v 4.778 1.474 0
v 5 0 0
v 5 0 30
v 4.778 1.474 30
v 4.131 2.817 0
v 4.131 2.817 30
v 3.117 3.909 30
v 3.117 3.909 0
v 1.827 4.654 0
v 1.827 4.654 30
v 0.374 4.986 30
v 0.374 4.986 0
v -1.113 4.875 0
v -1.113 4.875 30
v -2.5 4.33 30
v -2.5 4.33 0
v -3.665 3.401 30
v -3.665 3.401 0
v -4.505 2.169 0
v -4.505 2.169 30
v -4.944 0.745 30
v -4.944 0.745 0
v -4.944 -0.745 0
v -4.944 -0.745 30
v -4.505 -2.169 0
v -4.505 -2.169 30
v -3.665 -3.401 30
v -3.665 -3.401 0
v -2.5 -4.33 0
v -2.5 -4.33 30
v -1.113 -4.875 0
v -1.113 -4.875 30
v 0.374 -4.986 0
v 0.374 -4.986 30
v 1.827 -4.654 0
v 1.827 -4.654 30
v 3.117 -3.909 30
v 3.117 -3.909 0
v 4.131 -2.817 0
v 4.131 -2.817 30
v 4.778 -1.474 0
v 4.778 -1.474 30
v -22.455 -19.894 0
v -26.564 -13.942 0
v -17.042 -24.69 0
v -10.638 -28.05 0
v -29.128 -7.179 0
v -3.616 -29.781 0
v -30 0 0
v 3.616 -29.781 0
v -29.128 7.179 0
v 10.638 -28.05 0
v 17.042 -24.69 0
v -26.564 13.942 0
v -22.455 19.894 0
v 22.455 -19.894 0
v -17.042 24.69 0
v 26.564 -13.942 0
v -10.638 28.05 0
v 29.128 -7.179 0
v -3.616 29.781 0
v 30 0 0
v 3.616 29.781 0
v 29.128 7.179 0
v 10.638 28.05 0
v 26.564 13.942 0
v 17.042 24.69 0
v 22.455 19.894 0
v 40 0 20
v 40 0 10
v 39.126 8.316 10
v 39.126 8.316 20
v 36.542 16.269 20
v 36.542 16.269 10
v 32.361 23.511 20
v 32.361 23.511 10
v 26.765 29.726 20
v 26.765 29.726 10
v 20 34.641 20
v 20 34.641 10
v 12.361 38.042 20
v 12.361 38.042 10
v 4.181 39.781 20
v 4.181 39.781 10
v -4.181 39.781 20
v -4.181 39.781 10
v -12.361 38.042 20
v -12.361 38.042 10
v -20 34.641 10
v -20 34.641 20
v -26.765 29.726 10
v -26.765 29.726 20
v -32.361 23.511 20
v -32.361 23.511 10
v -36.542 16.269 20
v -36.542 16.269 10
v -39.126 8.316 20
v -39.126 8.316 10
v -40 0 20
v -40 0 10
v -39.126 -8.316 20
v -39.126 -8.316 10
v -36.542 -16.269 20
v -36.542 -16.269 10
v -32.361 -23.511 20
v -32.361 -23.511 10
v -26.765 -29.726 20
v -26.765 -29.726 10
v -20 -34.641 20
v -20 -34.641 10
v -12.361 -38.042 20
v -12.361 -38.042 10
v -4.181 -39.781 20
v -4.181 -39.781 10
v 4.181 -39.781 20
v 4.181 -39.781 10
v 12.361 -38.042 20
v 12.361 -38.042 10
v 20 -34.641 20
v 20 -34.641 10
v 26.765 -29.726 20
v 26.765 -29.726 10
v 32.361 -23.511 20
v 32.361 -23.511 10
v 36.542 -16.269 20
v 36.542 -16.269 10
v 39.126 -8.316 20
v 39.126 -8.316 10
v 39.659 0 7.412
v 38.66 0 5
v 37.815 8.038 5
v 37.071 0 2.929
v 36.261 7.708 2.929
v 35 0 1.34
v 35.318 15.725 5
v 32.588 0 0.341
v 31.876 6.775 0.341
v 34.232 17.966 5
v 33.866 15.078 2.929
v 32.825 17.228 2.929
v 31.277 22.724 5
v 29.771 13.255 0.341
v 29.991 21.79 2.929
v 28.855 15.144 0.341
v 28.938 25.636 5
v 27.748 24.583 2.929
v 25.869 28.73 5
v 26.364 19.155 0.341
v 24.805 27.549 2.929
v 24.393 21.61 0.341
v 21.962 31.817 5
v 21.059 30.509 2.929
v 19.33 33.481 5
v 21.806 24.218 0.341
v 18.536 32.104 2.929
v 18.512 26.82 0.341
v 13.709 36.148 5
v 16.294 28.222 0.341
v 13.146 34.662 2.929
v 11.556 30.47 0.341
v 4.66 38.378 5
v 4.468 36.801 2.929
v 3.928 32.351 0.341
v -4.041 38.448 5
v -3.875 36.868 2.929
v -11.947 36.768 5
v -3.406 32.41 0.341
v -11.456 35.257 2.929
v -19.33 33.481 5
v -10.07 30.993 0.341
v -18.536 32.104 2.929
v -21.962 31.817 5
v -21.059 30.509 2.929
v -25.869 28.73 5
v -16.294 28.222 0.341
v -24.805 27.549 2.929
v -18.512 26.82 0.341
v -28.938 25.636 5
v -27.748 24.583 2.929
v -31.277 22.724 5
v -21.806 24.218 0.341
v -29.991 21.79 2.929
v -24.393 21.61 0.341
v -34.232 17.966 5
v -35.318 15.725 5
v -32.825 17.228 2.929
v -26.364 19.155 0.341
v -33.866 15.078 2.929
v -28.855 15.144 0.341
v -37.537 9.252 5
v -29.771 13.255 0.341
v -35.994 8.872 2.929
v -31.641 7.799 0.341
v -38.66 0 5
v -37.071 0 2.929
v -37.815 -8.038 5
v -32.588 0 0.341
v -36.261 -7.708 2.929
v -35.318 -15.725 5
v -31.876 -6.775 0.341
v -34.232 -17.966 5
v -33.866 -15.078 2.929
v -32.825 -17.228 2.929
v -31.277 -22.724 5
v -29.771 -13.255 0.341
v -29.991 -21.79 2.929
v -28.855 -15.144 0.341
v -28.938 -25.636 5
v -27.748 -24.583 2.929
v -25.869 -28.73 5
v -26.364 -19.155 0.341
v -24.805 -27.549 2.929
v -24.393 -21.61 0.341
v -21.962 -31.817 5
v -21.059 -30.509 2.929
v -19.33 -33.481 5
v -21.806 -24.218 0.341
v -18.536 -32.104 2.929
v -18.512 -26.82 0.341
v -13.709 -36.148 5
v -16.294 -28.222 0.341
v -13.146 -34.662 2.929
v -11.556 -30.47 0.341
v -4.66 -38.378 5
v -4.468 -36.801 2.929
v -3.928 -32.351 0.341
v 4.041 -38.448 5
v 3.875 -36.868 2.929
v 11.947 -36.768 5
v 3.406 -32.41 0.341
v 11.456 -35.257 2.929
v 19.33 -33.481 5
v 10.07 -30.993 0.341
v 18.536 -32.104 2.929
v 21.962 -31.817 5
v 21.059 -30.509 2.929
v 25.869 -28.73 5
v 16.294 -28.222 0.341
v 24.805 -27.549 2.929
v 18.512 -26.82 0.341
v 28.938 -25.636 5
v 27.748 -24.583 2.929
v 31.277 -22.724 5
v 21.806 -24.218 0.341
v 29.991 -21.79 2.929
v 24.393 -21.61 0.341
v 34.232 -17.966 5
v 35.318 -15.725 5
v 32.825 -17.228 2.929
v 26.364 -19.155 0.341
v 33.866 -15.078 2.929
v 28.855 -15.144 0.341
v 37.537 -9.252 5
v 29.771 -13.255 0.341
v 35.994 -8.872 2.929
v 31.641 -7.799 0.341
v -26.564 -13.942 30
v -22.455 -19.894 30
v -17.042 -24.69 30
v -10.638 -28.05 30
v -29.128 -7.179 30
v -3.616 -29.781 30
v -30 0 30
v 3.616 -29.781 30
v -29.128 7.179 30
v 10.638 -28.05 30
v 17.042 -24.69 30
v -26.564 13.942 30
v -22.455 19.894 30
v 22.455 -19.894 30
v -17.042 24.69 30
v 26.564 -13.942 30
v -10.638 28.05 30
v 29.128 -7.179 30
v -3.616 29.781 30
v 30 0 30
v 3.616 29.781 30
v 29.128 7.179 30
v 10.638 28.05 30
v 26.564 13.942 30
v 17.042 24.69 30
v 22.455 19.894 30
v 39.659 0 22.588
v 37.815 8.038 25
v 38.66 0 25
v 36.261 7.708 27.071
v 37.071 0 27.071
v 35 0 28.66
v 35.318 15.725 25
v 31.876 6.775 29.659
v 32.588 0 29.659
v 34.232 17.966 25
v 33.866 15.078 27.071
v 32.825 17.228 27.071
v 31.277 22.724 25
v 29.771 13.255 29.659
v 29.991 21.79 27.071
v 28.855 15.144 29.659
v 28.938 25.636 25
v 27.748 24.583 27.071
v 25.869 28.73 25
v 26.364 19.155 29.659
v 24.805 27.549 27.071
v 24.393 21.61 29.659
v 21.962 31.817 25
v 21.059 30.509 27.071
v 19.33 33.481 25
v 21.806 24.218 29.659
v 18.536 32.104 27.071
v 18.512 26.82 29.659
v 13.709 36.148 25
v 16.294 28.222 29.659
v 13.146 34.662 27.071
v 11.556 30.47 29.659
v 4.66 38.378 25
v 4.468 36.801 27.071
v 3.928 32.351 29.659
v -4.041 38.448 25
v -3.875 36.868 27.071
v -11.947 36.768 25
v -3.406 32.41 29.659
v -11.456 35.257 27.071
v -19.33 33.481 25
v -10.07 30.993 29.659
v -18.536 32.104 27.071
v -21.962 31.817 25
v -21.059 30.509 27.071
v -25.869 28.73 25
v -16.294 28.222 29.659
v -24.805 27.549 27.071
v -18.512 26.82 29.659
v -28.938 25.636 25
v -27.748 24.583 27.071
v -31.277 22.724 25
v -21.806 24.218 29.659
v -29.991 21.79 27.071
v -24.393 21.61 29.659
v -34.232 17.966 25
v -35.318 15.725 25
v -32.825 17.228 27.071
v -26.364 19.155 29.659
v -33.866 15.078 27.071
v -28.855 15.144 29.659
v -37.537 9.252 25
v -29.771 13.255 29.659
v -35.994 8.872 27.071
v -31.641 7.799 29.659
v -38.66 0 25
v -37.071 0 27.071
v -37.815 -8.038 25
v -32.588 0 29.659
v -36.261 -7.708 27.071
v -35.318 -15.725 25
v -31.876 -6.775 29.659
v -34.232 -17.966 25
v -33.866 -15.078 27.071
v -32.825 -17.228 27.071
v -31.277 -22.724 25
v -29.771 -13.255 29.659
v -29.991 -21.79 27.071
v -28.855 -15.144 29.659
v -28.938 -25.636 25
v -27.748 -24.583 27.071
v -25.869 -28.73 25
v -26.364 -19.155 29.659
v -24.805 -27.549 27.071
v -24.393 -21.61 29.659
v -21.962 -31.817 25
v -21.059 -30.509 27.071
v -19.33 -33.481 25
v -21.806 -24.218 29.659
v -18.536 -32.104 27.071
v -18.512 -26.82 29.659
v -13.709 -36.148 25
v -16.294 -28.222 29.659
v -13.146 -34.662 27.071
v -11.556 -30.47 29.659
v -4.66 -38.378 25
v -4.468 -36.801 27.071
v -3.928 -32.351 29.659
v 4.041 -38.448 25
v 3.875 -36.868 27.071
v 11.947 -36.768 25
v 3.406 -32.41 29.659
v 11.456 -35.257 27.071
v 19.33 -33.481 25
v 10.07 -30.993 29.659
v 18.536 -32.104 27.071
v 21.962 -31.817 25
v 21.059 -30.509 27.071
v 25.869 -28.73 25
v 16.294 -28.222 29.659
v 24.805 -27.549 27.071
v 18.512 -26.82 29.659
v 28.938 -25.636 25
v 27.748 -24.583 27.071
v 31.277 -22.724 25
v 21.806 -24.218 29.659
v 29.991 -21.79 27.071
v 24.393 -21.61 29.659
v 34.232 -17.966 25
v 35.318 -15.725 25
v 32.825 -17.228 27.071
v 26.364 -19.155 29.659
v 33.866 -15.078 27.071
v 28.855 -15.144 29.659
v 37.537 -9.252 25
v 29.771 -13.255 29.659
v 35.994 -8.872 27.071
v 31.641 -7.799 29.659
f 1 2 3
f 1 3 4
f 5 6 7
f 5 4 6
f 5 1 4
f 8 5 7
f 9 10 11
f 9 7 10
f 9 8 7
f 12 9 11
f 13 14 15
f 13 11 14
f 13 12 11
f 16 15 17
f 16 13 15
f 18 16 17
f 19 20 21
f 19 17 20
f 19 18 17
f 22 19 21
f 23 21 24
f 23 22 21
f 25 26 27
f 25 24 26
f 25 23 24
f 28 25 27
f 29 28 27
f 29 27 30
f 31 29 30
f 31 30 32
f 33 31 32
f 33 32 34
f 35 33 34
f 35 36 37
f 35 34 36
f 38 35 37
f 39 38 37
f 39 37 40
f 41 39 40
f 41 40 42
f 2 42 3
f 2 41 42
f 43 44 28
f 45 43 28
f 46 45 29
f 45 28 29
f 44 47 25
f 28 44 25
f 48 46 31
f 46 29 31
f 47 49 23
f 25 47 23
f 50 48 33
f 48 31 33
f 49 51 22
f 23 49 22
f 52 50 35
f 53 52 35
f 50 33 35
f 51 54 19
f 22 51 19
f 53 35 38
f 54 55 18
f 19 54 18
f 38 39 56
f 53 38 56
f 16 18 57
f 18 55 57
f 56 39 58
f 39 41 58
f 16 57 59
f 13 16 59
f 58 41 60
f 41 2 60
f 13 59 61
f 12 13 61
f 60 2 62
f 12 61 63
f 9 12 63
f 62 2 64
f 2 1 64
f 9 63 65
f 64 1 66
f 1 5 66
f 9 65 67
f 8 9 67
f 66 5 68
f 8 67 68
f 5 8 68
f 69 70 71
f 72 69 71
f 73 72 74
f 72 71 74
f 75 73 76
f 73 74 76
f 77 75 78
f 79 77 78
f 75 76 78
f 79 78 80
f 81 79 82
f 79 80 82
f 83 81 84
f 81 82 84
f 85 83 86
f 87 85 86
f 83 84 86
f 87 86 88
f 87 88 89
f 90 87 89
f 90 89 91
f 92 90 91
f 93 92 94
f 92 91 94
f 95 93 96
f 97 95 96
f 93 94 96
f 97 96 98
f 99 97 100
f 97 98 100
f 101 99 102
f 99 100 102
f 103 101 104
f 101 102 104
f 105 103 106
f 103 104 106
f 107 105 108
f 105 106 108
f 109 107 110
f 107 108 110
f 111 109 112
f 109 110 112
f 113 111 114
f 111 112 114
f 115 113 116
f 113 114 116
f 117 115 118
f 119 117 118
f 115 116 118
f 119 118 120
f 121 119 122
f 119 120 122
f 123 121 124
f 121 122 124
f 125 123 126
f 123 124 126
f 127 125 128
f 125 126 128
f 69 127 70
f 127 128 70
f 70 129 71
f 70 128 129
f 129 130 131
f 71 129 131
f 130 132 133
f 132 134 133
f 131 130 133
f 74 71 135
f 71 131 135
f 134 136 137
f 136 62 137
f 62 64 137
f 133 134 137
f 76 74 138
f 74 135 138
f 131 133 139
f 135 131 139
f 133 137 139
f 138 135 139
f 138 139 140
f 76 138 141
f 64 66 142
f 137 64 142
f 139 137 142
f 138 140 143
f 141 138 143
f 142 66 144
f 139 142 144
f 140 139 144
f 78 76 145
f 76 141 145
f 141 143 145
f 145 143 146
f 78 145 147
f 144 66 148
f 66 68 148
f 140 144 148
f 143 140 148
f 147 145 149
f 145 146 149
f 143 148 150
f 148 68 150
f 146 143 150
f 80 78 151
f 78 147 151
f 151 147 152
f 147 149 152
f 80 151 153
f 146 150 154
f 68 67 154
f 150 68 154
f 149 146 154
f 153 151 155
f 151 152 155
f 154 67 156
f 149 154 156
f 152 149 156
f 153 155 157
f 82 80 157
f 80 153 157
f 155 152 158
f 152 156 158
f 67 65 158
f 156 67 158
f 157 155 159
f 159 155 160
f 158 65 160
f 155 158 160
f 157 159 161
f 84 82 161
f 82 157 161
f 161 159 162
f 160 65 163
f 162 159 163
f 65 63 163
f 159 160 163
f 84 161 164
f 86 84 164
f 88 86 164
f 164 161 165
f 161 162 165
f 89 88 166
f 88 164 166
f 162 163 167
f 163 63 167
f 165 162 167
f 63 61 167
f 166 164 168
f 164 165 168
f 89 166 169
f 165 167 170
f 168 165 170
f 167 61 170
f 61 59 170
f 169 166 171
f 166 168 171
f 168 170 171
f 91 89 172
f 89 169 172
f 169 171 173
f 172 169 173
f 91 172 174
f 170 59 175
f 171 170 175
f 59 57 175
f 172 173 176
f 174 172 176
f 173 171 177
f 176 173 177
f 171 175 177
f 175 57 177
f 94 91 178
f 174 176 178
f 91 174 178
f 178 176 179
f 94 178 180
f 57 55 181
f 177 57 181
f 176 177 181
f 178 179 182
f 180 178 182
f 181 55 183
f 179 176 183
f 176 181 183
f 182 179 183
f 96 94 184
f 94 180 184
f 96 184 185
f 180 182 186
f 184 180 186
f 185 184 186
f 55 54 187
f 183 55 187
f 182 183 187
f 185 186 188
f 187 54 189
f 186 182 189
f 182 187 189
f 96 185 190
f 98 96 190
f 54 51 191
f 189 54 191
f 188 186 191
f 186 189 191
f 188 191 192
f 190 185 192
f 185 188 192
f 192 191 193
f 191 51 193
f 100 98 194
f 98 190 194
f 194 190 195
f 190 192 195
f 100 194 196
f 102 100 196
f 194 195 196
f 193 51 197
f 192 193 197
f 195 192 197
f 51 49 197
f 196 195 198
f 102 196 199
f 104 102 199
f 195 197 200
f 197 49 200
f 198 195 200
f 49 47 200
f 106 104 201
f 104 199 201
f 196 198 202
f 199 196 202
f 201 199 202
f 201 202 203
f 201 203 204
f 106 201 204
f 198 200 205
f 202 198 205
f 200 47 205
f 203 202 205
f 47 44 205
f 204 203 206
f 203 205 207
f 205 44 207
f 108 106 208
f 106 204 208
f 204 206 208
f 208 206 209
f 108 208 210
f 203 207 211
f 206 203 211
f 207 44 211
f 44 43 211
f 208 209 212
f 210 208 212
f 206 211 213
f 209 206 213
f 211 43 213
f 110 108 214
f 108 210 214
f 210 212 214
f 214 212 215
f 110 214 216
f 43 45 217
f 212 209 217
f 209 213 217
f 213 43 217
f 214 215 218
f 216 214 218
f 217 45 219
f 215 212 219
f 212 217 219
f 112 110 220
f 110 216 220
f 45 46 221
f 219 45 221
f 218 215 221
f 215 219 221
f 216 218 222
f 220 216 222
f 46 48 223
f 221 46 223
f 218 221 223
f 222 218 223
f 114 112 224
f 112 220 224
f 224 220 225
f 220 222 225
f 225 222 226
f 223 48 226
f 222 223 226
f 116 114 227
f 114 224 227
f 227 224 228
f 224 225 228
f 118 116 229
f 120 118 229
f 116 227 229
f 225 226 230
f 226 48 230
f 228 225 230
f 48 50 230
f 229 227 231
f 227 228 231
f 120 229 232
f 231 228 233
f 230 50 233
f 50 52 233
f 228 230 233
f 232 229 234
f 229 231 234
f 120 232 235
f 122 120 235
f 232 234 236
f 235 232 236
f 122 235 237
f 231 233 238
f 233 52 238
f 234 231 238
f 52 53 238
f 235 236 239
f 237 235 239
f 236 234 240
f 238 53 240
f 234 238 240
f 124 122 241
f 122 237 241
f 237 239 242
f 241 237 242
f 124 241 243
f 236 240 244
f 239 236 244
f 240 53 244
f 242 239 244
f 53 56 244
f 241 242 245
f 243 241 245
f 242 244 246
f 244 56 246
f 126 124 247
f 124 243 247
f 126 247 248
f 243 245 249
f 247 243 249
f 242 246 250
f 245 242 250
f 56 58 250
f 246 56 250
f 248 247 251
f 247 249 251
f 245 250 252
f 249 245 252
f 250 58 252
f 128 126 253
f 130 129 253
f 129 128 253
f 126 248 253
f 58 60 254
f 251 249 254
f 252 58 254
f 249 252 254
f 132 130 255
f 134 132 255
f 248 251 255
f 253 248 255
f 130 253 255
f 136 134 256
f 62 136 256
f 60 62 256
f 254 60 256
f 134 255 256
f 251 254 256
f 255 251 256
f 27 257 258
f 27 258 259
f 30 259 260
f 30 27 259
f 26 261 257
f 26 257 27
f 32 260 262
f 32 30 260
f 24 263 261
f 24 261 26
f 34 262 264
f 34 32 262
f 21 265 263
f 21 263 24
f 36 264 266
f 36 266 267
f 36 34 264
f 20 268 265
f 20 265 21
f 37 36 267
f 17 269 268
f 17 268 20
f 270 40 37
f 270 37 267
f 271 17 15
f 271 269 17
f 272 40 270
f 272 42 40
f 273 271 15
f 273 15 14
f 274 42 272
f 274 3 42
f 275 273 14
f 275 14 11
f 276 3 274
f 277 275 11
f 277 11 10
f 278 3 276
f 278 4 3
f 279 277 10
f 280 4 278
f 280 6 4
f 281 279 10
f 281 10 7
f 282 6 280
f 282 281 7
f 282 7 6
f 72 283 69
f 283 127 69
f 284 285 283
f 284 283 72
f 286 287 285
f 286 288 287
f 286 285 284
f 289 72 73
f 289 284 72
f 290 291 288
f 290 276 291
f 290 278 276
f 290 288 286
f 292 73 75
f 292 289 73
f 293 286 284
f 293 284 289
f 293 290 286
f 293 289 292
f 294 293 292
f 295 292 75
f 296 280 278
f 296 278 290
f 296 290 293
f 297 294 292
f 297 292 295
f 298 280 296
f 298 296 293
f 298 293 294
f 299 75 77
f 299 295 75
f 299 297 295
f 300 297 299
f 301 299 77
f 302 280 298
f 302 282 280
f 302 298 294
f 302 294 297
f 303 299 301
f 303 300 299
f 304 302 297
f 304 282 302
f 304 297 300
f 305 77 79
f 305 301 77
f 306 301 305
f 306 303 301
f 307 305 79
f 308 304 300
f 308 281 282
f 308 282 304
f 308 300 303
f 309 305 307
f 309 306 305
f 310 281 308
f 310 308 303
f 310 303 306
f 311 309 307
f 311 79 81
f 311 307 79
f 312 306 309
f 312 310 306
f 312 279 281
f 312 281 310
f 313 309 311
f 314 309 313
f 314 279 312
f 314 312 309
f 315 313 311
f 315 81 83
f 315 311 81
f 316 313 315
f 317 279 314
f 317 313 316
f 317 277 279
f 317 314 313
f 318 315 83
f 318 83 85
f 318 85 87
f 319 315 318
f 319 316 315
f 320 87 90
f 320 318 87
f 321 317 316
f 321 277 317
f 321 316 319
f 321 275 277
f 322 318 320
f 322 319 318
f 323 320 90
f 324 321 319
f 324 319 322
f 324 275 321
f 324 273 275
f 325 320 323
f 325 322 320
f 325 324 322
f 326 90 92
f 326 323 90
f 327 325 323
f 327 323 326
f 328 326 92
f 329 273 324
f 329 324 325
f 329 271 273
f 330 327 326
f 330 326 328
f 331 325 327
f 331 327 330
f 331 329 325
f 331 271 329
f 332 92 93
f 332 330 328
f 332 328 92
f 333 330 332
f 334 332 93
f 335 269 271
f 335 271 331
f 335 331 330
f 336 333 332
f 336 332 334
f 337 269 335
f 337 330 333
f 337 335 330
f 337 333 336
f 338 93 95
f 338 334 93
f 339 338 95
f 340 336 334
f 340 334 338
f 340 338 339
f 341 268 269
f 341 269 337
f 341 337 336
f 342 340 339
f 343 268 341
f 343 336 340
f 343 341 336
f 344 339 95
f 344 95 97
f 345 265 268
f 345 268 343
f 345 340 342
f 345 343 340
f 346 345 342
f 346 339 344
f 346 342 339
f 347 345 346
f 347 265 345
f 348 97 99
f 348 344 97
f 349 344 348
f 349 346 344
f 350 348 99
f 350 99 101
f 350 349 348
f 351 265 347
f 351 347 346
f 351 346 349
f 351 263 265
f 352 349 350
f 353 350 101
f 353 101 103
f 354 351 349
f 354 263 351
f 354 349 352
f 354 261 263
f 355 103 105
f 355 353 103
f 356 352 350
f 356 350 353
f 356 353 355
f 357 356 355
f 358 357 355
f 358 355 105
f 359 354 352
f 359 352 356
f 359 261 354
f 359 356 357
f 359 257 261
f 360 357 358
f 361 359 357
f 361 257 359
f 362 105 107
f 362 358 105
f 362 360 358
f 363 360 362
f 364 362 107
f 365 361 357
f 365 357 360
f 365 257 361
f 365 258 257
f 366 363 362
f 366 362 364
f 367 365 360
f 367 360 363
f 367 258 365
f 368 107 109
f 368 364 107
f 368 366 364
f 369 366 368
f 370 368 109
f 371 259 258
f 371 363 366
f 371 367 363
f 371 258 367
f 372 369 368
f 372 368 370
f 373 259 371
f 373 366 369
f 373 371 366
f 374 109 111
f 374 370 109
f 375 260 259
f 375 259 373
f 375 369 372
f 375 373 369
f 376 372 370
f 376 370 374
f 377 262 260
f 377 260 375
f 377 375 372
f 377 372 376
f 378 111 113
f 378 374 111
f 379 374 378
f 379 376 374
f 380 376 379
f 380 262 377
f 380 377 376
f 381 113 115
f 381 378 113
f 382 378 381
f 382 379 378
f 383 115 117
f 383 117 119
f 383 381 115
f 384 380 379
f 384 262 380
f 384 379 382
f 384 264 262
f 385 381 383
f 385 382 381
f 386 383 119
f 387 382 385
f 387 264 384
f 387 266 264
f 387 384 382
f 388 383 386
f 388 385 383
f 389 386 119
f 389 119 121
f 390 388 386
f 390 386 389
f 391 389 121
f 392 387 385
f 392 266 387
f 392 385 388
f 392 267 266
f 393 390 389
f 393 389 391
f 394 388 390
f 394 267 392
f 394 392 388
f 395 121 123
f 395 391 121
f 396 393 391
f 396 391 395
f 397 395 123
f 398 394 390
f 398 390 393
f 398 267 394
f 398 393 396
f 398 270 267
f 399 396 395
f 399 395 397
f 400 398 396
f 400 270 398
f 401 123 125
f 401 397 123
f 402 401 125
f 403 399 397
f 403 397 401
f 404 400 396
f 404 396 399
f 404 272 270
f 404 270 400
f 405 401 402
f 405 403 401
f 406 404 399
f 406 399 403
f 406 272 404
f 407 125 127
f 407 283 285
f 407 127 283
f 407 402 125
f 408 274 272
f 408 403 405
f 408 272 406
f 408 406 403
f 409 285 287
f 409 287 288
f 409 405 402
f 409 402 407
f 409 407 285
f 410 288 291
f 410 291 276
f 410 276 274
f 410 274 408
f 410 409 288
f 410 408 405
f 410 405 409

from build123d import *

# Parameters (mm, degrees)
SKETCH1_R               = 40
BOSS_EXTRUDE1_DEPTH     = 30
FILLET1_R               = 10
CUT_EXTRUDE1_DEPTH      = 65.031242437
CUT_EXTRUDE1_DEPTH_BACK = 65.031242437
SKETCH2_R               = 5


with BuildPart() as part:
    # Sketch1 → Boss-Extrude1 (new body)
    with BuildSketch(Plane.XY):
        Circle(SKETCH1_R)
    extrude(amount=BOSS_EXTRUDE1_DEPTH)

    # Fillet1
    fillet1_edges = [part.edges().sort_by_distance(p)[0] for p in [
        (-40, 0, 0),
        (-40, 0, 30),
    ]]
    fillet(fillet1_edges, radius=FILLET1_R)

    # Sketch2 → Cut-Extrude1 (cut, two sides: drawn at the far end of the back side and taken through both)
    with BuildSketch(Plane.XY.offset(30).offset(-CUT_EXTRUDE1_DEPTH_BACK)):
        Circle(SKETCH2_R)
    extrude(amount=CUT_EXTRUDE1_DEPTH + CUT_EXTRUDE1_DEPTH_BACK, mode=Mode.SUBTRACT)


solid = part.part
